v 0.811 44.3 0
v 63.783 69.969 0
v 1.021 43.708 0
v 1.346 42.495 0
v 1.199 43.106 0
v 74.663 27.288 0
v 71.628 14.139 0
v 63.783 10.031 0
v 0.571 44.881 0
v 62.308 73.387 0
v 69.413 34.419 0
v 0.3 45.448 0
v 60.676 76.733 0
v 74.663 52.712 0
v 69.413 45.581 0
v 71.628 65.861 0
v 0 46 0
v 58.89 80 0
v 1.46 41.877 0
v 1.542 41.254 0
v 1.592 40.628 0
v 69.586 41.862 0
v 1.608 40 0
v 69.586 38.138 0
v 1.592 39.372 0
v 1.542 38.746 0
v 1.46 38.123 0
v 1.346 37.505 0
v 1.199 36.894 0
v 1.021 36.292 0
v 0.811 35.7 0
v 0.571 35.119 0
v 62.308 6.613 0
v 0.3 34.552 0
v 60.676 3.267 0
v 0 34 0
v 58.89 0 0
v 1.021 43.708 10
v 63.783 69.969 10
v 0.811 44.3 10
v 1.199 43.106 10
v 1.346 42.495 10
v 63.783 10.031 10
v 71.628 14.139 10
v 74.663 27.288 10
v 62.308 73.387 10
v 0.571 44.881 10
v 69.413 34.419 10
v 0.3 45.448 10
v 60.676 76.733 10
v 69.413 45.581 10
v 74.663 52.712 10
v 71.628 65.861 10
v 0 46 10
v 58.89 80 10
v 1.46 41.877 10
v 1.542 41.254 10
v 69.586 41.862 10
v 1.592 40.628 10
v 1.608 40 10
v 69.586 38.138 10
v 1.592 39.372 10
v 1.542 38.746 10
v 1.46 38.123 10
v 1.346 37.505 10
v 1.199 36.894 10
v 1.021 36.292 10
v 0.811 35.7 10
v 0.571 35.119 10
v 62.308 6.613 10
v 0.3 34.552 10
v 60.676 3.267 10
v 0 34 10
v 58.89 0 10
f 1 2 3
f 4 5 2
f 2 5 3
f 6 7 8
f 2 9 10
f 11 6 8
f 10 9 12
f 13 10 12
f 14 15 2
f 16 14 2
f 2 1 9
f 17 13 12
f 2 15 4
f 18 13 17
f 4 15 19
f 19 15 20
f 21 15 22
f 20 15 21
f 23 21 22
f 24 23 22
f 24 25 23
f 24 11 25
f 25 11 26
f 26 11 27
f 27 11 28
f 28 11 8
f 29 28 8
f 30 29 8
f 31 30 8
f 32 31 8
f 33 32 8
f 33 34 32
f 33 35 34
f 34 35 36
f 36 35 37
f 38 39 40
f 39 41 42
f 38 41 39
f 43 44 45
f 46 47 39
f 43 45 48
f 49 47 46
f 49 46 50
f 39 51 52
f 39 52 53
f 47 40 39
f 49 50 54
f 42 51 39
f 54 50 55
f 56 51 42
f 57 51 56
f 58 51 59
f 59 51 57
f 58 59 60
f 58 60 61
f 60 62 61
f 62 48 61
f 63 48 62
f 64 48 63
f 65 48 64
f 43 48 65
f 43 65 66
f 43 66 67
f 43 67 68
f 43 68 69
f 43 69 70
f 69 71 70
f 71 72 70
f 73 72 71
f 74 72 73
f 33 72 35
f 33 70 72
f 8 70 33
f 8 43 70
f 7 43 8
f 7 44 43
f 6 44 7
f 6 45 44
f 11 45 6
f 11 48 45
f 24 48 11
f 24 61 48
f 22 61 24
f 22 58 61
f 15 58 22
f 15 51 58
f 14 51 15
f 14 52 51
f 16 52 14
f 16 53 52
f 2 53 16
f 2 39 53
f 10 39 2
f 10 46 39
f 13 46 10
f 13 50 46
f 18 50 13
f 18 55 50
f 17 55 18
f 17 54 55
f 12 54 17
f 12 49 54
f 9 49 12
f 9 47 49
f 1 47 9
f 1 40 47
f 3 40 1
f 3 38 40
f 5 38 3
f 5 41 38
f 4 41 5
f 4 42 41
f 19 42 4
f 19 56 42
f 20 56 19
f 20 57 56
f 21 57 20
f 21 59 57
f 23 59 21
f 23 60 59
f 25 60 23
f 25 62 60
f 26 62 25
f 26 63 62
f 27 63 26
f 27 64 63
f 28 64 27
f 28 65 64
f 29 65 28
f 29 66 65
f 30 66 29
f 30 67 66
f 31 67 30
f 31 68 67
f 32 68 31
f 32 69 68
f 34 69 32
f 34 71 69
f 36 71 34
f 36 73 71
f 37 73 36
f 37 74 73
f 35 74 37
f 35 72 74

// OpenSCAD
$fn = 32;

// ----------------------------------------------------------------------
// Gear sector: 2 teeth on 60 degrees
// ----------------------------------------------------------------------

// --- parameters (mm) ---
sector_angle = 60;        // sector angle, degrees
root_r = 80;              // root circle radius
tooth_h = 6;              // tooth height over the root circle
teeth = 2;                // number of teeth on the sector
hub_r = 12;               // hub bore radius
plate_t = 10;             // sector thickness, Z
arc_step = 3;             // sampling step of the root/hub arcs, degrees

tip_r = root_r + tooth_h;  // tip circle radius

profile = [[58.89, 0], [60.676, 3.267], [62.308, 6.613], [63.783, 10.031], [71.628, 14.139], [74.663, 27.288], [69.413, 34.419], [69.586, 38.138], [69.586, 41.862], [69.413, 45.581], [74.663, 52.712], [71.628, 65.861], [63.783, 69.969], [62.308, 73.387], [60.676, 76.733], [58.89, 80], [0, 46], [0.3, 45.448], [0.571, 44.881], [0.811, 44.3], [1.021, 43.708], [1.199, 43.106], [1.346, 42.495], [1.46, 41.877], [1.542, 41.254], [1.592, 40.628], [1.608, 40], [1.592, 39.372], [1.542, 38.746], [1.46, 38.123], [1.346, 37.505], [1.199, 36.894], [1.021, 36.292], [0.811, 35.7], [0.571, 35.119], [0.3, 34.552], [0, 34]];  // primary outline, 37 points, counter clockwise

// --- the one profile operation ---
linear_extrude(height = plate_t) polygon(points = profile);
